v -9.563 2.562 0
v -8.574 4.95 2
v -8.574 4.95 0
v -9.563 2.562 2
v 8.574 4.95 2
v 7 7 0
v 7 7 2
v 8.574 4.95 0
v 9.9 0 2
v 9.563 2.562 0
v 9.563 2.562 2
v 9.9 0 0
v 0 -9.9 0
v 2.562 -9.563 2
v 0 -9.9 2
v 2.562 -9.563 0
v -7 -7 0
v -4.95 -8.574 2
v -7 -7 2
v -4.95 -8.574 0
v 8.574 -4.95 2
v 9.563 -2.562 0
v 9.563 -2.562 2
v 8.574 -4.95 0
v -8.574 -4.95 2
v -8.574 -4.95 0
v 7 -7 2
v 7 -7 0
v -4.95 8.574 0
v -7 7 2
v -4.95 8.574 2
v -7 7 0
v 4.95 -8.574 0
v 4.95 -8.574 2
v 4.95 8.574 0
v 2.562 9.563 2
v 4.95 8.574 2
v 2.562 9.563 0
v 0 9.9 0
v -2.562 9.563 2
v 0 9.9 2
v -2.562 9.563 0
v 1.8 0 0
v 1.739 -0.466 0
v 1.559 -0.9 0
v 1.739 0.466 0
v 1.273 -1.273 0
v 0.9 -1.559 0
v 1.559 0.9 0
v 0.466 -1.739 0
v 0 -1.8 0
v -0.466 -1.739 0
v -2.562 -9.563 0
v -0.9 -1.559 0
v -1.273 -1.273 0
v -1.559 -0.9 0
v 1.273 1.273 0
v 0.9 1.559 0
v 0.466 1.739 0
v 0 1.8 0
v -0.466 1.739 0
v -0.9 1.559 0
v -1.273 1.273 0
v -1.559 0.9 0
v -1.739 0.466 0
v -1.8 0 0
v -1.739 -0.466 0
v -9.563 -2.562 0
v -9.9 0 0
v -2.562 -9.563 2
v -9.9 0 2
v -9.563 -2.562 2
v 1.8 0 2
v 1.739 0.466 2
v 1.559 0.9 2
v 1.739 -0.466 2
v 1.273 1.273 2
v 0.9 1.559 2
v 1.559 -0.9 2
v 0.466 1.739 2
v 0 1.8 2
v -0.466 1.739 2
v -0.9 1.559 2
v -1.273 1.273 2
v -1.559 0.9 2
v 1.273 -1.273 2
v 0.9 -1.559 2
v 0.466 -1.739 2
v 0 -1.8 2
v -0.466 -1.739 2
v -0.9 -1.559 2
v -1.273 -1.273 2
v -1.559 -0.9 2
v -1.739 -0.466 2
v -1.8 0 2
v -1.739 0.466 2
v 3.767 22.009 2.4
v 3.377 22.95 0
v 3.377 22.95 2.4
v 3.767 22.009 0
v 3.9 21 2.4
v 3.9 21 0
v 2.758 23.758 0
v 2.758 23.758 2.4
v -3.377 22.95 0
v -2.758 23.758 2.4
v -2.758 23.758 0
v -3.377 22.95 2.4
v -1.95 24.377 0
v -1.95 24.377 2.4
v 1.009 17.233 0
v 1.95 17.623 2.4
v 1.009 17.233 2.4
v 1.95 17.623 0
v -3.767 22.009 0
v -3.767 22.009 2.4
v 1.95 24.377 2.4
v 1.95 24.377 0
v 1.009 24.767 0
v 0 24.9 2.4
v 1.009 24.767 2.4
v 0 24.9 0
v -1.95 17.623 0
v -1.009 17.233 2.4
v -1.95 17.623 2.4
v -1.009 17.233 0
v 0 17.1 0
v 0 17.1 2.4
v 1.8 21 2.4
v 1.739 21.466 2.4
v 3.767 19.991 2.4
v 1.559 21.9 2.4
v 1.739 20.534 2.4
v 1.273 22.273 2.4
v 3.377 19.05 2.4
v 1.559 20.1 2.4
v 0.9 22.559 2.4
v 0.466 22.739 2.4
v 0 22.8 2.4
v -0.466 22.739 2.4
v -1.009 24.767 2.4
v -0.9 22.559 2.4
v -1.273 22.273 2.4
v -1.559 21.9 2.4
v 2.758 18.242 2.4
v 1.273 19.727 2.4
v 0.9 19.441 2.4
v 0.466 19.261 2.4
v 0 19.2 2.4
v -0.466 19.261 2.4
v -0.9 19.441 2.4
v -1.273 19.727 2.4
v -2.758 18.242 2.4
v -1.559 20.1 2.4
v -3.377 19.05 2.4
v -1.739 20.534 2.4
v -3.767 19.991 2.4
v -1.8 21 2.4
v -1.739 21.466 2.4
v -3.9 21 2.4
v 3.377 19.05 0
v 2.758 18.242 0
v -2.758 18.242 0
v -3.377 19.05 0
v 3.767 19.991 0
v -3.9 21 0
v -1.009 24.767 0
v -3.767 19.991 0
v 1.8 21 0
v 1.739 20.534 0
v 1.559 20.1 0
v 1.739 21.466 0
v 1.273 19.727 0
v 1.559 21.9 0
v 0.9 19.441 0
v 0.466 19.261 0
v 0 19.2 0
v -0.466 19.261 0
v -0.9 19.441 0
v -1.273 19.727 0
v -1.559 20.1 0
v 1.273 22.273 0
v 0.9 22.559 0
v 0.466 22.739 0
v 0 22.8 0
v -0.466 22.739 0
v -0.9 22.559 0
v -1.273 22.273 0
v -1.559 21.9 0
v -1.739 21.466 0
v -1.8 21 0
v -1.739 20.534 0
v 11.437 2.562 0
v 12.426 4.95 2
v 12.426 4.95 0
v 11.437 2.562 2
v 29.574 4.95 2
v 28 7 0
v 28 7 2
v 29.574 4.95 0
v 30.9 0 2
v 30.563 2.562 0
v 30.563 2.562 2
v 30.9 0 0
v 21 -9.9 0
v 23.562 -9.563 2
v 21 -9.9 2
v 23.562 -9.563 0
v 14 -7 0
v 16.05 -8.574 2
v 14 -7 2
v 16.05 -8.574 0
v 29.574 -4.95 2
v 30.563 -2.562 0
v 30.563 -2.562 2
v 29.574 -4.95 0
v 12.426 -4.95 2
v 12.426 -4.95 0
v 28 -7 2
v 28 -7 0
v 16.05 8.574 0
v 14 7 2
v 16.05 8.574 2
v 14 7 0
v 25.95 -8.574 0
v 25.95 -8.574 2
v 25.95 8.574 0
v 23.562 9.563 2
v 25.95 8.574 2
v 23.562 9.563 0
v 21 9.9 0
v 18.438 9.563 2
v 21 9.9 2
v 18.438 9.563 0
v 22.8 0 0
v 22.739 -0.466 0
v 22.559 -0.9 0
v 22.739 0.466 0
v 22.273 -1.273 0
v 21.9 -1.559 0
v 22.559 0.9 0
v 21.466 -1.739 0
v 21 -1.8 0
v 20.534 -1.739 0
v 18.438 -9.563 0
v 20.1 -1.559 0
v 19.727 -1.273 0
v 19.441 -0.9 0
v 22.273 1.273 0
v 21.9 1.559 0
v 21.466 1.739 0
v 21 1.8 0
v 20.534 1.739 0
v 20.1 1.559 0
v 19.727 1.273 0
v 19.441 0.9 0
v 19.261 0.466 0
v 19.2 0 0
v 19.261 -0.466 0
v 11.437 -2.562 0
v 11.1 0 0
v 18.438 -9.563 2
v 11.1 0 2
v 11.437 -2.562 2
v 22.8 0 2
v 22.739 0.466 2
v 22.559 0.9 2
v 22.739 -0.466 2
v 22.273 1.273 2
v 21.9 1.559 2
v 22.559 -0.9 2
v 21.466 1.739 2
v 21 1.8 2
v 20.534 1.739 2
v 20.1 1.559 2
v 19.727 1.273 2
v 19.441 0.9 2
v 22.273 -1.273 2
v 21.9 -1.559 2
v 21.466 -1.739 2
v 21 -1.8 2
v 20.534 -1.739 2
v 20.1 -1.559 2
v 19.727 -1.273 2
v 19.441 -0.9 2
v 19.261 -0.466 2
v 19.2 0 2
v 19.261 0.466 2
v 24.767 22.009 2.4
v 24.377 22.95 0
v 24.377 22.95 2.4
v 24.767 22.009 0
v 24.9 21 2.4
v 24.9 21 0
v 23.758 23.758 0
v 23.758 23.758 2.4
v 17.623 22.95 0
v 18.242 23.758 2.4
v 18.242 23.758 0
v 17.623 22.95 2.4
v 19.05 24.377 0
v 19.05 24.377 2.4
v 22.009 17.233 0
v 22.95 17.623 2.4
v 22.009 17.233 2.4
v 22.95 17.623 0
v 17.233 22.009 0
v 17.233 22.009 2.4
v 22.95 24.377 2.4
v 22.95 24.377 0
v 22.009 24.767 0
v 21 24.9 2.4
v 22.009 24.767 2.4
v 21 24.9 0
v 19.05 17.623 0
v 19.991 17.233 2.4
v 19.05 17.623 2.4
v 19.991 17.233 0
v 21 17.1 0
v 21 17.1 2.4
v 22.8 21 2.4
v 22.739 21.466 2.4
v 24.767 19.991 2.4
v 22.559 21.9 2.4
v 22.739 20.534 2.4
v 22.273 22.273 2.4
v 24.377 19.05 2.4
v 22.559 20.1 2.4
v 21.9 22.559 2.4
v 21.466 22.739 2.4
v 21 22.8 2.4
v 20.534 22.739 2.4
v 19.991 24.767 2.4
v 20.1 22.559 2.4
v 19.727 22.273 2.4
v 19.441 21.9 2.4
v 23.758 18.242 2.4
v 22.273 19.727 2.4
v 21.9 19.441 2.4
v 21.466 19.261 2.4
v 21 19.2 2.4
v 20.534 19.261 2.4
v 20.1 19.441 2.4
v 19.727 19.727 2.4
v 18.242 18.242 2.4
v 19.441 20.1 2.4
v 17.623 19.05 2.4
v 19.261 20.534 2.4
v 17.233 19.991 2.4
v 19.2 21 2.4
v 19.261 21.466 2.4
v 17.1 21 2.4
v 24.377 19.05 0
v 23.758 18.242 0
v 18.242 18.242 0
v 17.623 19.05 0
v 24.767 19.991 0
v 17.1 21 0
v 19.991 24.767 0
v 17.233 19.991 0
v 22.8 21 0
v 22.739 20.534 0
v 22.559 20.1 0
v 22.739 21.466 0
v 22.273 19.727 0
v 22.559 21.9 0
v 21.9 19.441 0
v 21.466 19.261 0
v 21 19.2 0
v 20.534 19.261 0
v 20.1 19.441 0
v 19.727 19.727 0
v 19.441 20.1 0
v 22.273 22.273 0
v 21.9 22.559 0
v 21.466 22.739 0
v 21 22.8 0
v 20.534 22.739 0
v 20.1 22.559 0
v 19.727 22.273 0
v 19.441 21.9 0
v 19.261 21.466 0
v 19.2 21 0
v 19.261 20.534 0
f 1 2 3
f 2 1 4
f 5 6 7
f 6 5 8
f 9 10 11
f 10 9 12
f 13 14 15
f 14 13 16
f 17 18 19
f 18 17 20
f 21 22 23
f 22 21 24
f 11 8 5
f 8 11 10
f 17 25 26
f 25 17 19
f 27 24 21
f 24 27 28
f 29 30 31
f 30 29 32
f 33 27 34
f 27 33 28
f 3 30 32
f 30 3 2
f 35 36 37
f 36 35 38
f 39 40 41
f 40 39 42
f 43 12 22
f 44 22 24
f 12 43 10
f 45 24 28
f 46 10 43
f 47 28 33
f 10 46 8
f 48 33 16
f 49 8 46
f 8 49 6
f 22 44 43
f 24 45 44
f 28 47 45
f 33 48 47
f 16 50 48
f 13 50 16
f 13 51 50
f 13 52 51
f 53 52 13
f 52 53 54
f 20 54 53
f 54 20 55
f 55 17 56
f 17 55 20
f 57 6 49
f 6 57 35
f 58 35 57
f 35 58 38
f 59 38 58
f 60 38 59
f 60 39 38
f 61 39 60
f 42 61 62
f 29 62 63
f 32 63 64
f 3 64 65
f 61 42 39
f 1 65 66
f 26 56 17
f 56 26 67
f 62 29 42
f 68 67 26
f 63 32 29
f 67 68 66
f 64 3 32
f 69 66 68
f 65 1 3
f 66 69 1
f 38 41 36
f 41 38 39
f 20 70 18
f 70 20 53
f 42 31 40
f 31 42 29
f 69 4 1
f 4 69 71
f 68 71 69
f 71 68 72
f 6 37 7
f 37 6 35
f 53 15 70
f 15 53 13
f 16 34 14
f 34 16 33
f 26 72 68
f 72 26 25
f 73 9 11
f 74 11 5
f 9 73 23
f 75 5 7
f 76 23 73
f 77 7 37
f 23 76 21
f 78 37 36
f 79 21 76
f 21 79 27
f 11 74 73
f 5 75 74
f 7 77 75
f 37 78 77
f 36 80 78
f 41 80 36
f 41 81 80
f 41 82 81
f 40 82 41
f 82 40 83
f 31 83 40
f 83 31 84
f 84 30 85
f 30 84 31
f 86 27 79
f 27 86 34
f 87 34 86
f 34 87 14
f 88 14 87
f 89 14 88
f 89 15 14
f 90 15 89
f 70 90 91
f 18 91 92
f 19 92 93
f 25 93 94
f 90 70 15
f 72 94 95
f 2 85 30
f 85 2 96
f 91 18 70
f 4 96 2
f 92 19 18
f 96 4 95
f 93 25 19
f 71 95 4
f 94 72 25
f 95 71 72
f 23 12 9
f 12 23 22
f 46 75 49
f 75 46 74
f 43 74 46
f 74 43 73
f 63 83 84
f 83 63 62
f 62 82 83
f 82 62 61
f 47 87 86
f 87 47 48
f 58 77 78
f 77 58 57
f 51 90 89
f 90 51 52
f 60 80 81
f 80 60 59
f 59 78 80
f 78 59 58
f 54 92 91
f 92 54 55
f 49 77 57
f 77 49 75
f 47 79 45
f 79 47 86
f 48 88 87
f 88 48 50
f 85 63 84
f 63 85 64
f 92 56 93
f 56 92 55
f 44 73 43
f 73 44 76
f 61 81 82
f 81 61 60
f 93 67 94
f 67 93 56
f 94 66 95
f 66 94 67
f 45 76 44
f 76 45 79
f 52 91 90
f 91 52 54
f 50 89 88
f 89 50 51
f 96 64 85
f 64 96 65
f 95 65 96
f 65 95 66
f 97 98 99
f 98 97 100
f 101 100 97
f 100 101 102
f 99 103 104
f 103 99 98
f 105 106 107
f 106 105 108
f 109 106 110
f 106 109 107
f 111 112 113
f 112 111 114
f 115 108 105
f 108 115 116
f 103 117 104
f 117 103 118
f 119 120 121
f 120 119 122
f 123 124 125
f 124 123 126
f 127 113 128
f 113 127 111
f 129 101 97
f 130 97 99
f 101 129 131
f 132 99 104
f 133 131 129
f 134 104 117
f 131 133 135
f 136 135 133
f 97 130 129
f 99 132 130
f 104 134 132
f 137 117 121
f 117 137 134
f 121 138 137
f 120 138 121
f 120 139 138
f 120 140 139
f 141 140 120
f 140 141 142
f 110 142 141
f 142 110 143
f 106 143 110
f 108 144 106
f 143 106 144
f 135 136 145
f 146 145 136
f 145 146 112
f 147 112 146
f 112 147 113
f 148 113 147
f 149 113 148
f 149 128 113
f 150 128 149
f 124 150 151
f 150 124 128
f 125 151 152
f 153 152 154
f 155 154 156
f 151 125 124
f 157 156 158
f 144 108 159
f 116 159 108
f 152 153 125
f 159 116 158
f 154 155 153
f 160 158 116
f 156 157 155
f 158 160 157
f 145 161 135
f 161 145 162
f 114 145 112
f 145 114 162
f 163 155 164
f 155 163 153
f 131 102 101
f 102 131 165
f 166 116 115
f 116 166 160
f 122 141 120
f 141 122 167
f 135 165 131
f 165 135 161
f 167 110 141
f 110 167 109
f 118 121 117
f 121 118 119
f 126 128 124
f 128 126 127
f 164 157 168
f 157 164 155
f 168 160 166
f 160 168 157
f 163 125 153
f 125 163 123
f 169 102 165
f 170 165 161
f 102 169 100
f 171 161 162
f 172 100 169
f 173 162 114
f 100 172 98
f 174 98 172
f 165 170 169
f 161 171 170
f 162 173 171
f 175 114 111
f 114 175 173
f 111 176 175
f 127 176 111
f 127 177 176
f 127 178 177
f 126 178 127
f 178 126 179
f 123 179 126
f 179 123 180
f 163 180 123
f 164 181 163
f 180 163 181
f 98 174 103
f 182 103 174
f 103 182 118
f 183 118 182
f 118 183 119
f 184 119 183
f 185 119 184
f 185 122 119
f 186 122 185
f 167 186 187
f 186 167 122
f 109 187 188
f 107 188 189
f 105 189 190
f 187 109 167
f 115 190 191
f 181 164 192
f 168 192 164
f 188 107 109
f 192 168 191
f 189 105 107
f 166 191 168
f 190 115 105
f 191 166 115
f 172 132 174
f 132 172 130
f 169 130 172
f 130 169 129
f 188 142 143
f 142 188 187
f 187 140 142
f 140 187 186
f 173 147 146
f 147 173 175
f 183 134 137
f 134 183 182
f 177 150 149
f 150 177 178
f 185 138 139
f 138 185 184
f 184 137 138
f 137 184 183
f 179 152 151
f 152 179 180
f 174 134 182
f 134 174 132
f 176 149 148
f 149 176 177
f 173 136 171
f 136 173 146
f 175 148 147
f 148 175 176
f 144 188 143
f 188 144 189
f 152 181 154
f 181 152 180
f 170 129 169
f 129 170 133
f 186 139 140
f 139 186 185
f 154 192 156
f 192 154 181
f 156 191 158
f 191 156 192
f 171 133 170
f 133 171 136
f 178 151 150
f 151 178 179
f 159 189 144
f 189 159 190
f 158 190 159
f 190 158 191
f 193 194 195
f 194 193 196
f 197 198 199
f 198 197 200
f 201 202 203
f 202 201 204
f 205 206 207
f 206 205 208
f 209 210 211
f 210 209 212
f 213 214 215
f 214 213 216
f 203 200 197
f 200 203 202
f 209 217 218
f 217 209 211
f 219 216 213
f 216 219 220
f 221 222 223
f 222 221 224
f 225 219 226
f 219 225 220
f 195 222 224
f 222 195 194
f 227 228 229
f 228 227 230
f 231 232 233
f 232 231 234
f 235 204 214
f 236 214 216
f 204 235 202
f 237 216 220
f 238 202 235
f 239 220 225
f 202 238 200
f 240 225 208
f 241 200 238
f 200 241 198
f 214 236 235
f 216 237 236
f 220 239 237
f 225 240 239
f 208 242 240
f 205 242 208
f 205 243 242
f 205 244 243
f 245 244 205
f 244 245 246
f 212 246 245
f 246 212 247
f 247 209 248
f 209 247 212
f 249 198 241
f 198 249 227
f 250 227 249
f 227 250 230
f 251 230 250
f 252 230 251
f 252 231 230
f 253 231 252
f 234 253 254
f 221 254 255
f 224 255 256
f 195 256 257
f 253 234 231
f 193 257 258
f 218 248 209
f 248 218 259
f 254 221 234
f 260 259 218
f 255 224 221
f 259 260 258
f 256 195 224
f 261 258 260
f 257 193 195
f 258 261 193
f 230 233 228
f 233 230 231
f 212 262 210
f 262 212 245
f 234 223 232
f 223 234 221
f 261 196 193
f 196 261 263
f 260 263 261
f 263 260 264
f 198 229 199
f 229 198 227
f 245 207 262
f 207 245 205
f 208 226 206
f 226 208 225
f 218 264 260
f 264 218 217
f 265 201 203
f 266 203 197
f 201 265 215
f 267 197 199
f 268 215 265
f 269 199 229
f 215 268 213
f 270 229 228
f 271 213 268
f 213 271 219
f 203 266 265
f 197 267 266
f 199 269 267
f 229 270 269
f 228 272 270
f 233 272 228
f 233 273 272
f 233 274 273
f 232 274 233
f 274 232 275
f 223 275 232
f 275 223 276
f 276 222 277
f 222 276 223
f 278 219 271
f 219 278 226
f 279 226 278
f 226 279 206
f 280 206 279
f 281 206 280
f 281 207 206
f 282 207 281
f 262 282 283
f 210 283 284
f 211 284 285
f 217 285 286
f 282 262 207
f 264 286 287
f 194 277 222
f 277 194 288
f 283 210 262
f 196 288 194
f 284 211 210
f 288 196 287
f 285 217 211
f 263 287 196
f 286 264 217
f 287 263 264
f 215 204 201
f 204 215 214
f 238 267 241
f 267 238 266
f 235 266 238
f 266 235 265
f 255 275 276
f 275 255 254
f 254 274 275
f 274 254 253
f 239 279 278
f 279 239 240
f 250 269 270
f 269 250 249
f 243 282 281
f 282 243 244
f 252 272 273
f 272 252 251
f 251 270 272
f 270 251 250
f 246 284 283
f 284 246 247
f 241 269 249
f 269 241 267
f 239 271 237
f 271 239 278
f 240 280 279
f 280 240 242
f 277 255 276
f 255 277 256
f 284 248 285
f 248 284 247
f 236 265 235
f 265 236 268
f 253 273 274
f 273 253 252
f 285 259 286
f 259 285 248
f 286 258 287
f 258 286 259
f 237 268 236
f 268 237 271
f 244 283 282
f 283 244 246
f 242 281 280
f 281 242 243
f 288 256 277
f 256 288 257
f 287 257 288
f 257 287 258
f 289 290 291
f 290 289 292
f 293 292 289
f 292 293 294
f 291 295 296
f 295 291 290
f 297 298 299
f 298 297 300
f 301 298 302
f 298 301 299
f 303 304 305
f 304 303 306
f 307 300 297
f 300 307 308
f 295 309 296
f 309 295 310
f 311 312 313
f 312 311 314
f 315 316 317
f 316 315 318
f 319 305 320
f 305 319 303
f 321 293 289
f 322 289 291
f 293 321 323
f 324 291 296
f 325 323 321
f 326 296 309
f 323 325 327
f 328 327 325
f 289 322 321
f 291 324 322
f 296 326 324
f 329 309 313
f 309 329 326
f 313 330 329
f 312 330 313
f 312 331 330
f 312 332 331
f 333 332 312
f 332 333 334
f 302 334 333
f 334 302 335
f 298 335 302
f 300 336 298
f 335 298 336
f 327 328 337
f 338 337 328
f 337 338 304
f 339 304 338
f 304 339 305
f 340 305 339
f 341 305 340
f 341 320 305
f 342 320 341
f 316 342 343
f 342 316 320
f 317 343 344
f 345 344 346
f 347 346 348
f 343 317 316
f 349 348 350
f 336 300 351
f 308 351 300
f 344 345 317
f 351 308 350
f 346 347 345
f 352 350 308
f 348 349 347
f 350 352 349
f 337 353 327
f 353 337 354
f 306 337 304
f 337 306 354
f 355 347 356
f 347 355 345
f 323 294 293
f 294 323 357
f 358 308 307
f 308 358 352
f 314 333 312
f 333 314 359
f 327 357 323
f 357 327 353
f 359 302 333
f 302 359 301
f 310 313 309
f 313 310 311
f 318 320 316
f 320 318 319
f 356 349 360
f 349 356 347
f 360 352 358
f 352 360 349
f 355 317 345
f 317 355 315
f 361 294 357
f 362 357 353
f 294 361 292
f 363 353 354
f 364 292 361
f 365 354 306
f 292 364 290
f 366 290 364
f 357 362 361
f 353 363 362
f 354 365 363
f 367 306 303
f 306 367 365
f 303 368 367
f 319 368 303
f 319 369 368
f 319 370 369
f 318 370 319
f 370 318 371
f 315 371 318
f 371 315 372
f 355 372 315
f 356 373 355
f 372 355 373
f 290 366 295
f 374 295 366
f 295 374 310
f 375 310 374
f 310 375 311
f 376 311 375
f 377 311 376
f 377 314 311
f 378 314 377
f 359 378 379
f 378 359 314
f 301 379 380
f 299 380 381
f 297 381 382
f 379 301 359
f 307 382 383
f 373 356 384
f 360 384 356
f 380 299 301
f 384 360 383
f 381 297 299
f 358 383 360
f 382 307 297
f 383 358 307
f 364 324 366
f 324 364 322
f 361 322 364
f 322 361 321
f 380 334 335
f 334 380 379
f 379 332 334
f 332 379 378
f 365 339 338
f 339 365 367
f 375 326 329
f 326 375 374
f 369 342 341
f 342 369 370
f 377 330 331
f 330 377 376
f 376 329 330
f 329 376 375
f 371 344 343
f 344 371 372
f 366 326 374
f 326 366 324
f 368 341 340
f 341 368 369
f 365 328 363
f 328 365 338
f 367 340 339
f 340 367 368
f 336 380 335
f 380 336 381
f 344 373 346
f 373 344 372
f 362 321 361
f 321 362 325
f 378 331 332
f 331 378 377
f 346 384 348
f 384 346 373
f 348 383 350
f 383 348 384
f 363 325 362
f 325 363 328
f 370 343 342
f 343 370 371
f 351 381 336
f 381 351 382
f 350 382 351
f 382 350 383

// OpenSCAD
// file: ring.scad
module ring(
    diameter,
    height,
    thickness, inner_diameter = 0
) {
    e = 0.034;
    thickness = thickness != undef
        ? thickness
        : (diameter - inner_diameter) / 2;

    difference() {
        cylinder(d = diameter, h = height);

        translate([0, 0, -e]) {
            cylinder(d = diameter - thickness * 2, h = height + e * 2);
        }
    }
}
// file: nuts_and_bolts.scad
SCREW_DIAMETER = 3.2; // TODO: confirm and standardize against PCB_HOLE_DIAMETER
SCREW_HEAD_DIAMETER = 6;
SCREW_HEAD_HEIGHT = 2.1;
NUT_DIAMETER = 6.4;
NUT_HEIGHT = 2.4;

FLATHEAD_SCREWDRIVER_POINT = .8;

module nut(
    diameter = NUT_DIAMETER,
    height = NUT_HEIGHT,
    hole_diameter = SCREW_DIAMETER
) {
    e = .0852;

    difference() {
        translate([diameter / -2, diameter / -2, 0]) {
            cube([diameter, diameter, height]);
        }

        translate([0, 0, -e]) {
            cylinder(
                d = hole_diameter,
                h = height + 2 * 2
            );
        }
    }
}

module nuts(
    pcb_position = [],
    positions = [],
    y = 0,
    z = 0,
    diameter = NUT_DIAMETER,
    height = NUT_HEIGHT
) {
    for (xy = positions) {
        translate([
            pcb_position.x + xy.x - diameter / 2,
            y + pcb_position.y + xy.y - diameter / 2,
            z
        ]) {
            cube([diameter, diameter, height]);
        }
    }
}

module screws(
    positions = PCB_HOLE_POSITIONS,
    pcb_position = [],
    diameter = PCB_HOLE_DIAMETER - .2,
    length = 3/4 * 25.4,
    z = 0
) {
    e = .03;

    for (xy = positions) {
        translate([
            pcb_position.x + xy.x,
            pcb_position.y + xy.y,
            z
        ]) {
            cylinder(
                d = SCREW_HEAD_DIAMETER,
                h = SCREW_HEAD_HEIGHT
            );

            translate([0, 0, SCREW_HEAD_HEIGHT - e]) {
                cylinder(
                    d = diameter,
                    h = length + e
                );
            }
        }
    }
}
// main file
include <nuts_and_bolts.scad>;
include <ring.scad>;

MOUNTING_BAR_HOLE_DIAMETER = 7;
MOUNTING_BAR_MATERIAL_DEPTH = 2;

module mount_block(
    width = 40,
    length = 40,
    height = 40,

    through_holes_x = [20],
    through_holes_z = [40 * (.2), 40 * (1 - .2)],
    through_hole_diameter = 4,
    through_hole_fastener_depth = 8,
    through_hole_fastener_diameter = 9,

    _bottom_clamp_cavity_depth = 3,
    _bottom_clamp_cavity_diameter = 32,

    tolerance = 0
) {
    e = .0418;

    module _through_holes() {
        module _hole(rotation = [0, 0, 0], include_fastener = true) {
            rotate(rotation) {
                if (include_fastener) {
                    cylinder(
                        d = through_hole_fastener_diameter + tolerance * 2,
                        h = through_hole_fastener_depth + e
                    );
                }

                cylinder(
                    d = through_hole_diameter + tolerance * 2,
                    h = max(width, length, height) + e * 2
                );
            }
        }

        for (z = through_holes_x) {
            translate([-e, length / 2, z]) {
                _hole([0, 90, 0], false);
            }
        }

        for (z = through_holes_z) {
            translate([width / 2, -e, z]) {
                _hole([-90, 0, 0]);
            }
        }
    }

    module _bottom_clamp_cavity() {
        translate([width / 2, length / 2, -e]) {
            cylinder(
                d = _bottom_clamp_cavity_diameter,
                h = _bottom_clamp_cavity_depth + e
            );
        }
    }

    difference() {
        cube([width, length, height]);

        _through_holes();
        _bottom_clamp_cavity();
    }
}

module mount_block_washers(
    mounting_bar_washer_diameter = 20,
    mounting_bar_washer_height = MOUNTING_BAR_MATERIAL_DEPTH,

    fastener_gutter_washer_diameter = 8,
    fastener_gutter_washer_height = NUT_HEIGHT,

    inner_diameter = 3.4,

    tolerance = 0,

    $fn = 24
) {
    plot = max(mounting_bar_washer_diameter, fastener_gutter_washer_diameter)
        + 1;

    for (x = [0, plot]) {
        translate([x, 0, 0]) {
            ring(
                diameter = mounting_bar_washer_diameter - tolerance * 2,
                height = mounting_bar_washer_height,
                inner_diameter = inner_diameter + tolerance * 2
            );
        }

        translate([x, plot, 0]) {
            ring(
                diameter = fastener_gutter_washer_diameter - tolerance * 2,
                height = fastener_gutter_washer_height,
                inner_diameter = inner_diameter + tolerance * 2
            );
        }
    }
}

* mount_block(
    tolerance = .1
);

mount_block_washers(
    tolerance = .1
);
